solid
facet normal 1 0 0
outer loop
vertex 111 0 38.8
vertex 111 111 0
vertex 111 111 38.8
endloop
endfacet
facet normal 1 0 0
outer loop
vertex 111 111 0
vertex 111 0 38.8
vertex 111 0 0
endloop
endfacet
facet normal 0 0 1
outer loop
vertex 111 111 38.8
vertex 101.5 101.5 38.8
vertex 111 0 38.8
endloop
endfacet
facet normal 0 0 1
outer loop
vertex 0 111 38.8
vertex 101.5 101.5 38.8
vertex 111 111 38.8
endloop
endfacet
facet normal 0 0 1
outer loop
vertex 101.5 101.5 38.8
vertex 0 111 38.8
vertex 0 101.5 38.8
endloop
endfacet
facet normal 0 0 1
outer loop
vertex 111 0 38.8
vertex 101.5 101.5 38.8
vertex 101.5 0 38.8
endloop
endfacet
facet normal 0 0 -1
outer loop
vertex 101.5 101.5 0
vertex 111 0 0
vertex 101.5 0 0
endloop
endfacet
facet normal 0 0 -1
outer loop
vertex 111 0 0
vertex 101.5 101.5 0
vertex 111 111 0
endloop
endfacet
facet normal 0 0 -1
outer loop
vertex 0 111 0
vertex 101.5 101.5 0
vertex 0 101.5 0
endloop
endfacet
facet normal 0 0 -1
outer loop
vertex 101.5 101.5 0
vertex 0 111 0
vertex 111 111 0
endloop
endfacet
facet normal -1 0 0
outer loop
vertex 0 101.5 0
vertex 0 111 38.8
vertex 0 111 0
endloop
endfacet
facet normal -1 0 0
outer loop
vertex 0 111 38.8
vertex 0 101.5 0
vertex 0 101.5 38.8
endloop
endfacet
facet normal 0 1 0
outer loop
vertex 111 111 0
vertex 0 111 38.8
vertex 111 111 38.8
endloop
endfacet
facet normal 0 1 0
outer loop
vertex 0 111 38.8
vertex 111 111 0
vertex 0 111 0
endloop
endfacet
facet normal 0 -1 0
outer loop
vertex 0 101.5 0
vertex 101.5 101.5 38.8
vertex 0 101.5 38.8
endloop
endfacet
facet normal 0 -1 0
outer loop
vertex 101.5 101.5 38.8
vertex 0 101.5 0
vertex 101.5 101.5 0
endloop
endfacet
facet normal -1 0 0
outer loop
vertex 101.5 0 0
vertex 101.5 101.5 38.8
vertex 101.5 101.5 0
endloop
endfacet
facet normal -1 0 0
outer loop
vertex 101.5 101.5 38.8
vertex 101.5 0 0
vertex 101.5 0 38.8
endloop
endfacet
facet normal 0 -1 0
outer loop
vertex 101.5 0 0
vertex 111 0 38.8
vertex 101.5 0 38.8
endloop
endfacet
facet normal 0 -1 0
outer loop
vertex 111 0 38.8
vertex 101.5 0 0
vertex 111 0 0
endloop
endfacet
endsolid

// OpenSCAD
module stucco(x) {
    color("Cornsilk") translate([0,1.5+25*x,0]) cube([25*x+1.5+12.5-3,12.5-3,38.8]);
    color("Cornsilk") translate([1.5+25*x,0,0]) cube([12.5-3,25*x+1.5,38.8]);
}

module corner_frame(x,slash=false,reverse_slash=false,cross_beam=false) {
    thickness = 1.51;
    color("SaddleBrown") {
        translate([0,25*x-10.2,0]) cube([25*x-10.2,thickness,3]);
        translate([0,25*x-10.2,38.8-3]) cube([25*x-10.2,thickness,3]);
        translate([0,25*x-10.2,3]) cube([1.5,thickness,38.8-6]);
        translate([25*x-10.2,25*x-10.2,0]) cube([1.5,thickness,38.8]);

        translate([0,25*x-1.5,0]) cube([25*x-3,thickness,3]);
        translate([0,25*x-1.5,38.8-3]) cube([25*x-3,thickness,3]);
        translate([0,25*x-1.5,3]) cube([1.5,thickness,38.8-6]);
        translate([25*x-3,25*x-1.5,0]) cube([3,thickness,38.8]);

        translate([25*x-10.2,0,0]) cube([thickness,25*x-10.2,3]);
        translate([25*x-10.2,0,38.8-3]) cube([thickness,25*x-10.2,3]);
        translate([25*x-10.2,0,3]) cube([thickness,1.5,38.8-6]);
        translate([25*x-10.2,25*x-10.2,0]) cube([thickness,1.5,38.8]);

        translate([25*x-1.5,0,0]) cube([thickness,25*x-3,3]);
        translate([25*x-1.5,0,38.8-3]) cube([thickness,25*x-3,3]);
        translate([25*x-1.5,0,3]) cube([thickness,1.5,38.8-6]);
        translate([25*x-1.5,25*x-3,0]) cube([thickness,1.5,38.8]);

        for (i = [1:(x-1)]) {
            translate([25*i-1.5,25*x-10.2,3]) cube([3,thickness,38.8-6]);
            translate([25*i-1.5,25*x-1.5,3]) cube([3,thickness,38.8-6]);
            translate([25*x-10.2,25*i-1.5,3]) cube([thickness,3,38.8-6]);
            translate([25*x-1.5,25*i-1.5,3]) cube([thickness,3,38.8-6]);
        }
        for (i = [1:x]) {
            if (slash) {
                if(i%2 == 0) {
                     translate([25*(i-1),0,3]) rotate([0,-57,0]) mirror([0,0,1]) cube([41,thickness,3]);
                } else {
                     translate([25*(i-1),0,38.8-3]) rotate([0,57,0]) cube([41,thickness,3]);
                }
            }
            if (reverse_slash) {
                if(i%2 == 0) {
                     translate([25*(i-1),0,38.8-3]) rotate([0,57,0]) cube([41,thickness,3]);
                     // Double
                     //translate([25*(i-1),0,38.8-3]) rotate([0,36,0]) cube([59,thickness,3]);
                } else {
                     translate([25*(i-1),0,3]) rotate([0,-57,0]) mirror([0,0,1]) cube([41,thickness,3]);
                     // Double
                     // translate([25*(i-1),0,3]) rotate([0,-36,0]) mirror([0,0,1]) cube([59,thickness,3]);
                }
            }
            if (cross_beam) {
                translate([25*(i-1)+1.5,0,38.8/3+1]) cube([25-3,thickness,3]);
            }
        }
    }
}

stucco(4);
/*
corner_frame(2,slash=false,reverse_slash=false,cross_beam=false);
translate([0,10.2-1.5,0]) wall_frame(2, slash=true);
*/
/*
thickness = 1.51;
x=2;



difference() {
        translate([0,0,3]) rotate([0,-37,0]) mirror([0,0,1]) cube([58,thickness,3]);

        translate([0,-.1,0]) cube([25*x,thickness+.2,3]);
        translate([0,-.1,38.8-3]) cube([25*x,thickness+.2,3]);
        translate([0,-.1,3-.1]) cube([1.5,thickness+.2,38.8-6+.2]);
        translate([25*x-3,-.1,3-.1]) cube([1.5,thickness+.2,38.8-6+.2]);
    if (x > 1) {
        for (i = [1:(x-1)]) {
            translate([25*i-1.5,-.1,3-.1]) cube([3,thickness+.2,38.8-6]);
        }
    }
}
*/
